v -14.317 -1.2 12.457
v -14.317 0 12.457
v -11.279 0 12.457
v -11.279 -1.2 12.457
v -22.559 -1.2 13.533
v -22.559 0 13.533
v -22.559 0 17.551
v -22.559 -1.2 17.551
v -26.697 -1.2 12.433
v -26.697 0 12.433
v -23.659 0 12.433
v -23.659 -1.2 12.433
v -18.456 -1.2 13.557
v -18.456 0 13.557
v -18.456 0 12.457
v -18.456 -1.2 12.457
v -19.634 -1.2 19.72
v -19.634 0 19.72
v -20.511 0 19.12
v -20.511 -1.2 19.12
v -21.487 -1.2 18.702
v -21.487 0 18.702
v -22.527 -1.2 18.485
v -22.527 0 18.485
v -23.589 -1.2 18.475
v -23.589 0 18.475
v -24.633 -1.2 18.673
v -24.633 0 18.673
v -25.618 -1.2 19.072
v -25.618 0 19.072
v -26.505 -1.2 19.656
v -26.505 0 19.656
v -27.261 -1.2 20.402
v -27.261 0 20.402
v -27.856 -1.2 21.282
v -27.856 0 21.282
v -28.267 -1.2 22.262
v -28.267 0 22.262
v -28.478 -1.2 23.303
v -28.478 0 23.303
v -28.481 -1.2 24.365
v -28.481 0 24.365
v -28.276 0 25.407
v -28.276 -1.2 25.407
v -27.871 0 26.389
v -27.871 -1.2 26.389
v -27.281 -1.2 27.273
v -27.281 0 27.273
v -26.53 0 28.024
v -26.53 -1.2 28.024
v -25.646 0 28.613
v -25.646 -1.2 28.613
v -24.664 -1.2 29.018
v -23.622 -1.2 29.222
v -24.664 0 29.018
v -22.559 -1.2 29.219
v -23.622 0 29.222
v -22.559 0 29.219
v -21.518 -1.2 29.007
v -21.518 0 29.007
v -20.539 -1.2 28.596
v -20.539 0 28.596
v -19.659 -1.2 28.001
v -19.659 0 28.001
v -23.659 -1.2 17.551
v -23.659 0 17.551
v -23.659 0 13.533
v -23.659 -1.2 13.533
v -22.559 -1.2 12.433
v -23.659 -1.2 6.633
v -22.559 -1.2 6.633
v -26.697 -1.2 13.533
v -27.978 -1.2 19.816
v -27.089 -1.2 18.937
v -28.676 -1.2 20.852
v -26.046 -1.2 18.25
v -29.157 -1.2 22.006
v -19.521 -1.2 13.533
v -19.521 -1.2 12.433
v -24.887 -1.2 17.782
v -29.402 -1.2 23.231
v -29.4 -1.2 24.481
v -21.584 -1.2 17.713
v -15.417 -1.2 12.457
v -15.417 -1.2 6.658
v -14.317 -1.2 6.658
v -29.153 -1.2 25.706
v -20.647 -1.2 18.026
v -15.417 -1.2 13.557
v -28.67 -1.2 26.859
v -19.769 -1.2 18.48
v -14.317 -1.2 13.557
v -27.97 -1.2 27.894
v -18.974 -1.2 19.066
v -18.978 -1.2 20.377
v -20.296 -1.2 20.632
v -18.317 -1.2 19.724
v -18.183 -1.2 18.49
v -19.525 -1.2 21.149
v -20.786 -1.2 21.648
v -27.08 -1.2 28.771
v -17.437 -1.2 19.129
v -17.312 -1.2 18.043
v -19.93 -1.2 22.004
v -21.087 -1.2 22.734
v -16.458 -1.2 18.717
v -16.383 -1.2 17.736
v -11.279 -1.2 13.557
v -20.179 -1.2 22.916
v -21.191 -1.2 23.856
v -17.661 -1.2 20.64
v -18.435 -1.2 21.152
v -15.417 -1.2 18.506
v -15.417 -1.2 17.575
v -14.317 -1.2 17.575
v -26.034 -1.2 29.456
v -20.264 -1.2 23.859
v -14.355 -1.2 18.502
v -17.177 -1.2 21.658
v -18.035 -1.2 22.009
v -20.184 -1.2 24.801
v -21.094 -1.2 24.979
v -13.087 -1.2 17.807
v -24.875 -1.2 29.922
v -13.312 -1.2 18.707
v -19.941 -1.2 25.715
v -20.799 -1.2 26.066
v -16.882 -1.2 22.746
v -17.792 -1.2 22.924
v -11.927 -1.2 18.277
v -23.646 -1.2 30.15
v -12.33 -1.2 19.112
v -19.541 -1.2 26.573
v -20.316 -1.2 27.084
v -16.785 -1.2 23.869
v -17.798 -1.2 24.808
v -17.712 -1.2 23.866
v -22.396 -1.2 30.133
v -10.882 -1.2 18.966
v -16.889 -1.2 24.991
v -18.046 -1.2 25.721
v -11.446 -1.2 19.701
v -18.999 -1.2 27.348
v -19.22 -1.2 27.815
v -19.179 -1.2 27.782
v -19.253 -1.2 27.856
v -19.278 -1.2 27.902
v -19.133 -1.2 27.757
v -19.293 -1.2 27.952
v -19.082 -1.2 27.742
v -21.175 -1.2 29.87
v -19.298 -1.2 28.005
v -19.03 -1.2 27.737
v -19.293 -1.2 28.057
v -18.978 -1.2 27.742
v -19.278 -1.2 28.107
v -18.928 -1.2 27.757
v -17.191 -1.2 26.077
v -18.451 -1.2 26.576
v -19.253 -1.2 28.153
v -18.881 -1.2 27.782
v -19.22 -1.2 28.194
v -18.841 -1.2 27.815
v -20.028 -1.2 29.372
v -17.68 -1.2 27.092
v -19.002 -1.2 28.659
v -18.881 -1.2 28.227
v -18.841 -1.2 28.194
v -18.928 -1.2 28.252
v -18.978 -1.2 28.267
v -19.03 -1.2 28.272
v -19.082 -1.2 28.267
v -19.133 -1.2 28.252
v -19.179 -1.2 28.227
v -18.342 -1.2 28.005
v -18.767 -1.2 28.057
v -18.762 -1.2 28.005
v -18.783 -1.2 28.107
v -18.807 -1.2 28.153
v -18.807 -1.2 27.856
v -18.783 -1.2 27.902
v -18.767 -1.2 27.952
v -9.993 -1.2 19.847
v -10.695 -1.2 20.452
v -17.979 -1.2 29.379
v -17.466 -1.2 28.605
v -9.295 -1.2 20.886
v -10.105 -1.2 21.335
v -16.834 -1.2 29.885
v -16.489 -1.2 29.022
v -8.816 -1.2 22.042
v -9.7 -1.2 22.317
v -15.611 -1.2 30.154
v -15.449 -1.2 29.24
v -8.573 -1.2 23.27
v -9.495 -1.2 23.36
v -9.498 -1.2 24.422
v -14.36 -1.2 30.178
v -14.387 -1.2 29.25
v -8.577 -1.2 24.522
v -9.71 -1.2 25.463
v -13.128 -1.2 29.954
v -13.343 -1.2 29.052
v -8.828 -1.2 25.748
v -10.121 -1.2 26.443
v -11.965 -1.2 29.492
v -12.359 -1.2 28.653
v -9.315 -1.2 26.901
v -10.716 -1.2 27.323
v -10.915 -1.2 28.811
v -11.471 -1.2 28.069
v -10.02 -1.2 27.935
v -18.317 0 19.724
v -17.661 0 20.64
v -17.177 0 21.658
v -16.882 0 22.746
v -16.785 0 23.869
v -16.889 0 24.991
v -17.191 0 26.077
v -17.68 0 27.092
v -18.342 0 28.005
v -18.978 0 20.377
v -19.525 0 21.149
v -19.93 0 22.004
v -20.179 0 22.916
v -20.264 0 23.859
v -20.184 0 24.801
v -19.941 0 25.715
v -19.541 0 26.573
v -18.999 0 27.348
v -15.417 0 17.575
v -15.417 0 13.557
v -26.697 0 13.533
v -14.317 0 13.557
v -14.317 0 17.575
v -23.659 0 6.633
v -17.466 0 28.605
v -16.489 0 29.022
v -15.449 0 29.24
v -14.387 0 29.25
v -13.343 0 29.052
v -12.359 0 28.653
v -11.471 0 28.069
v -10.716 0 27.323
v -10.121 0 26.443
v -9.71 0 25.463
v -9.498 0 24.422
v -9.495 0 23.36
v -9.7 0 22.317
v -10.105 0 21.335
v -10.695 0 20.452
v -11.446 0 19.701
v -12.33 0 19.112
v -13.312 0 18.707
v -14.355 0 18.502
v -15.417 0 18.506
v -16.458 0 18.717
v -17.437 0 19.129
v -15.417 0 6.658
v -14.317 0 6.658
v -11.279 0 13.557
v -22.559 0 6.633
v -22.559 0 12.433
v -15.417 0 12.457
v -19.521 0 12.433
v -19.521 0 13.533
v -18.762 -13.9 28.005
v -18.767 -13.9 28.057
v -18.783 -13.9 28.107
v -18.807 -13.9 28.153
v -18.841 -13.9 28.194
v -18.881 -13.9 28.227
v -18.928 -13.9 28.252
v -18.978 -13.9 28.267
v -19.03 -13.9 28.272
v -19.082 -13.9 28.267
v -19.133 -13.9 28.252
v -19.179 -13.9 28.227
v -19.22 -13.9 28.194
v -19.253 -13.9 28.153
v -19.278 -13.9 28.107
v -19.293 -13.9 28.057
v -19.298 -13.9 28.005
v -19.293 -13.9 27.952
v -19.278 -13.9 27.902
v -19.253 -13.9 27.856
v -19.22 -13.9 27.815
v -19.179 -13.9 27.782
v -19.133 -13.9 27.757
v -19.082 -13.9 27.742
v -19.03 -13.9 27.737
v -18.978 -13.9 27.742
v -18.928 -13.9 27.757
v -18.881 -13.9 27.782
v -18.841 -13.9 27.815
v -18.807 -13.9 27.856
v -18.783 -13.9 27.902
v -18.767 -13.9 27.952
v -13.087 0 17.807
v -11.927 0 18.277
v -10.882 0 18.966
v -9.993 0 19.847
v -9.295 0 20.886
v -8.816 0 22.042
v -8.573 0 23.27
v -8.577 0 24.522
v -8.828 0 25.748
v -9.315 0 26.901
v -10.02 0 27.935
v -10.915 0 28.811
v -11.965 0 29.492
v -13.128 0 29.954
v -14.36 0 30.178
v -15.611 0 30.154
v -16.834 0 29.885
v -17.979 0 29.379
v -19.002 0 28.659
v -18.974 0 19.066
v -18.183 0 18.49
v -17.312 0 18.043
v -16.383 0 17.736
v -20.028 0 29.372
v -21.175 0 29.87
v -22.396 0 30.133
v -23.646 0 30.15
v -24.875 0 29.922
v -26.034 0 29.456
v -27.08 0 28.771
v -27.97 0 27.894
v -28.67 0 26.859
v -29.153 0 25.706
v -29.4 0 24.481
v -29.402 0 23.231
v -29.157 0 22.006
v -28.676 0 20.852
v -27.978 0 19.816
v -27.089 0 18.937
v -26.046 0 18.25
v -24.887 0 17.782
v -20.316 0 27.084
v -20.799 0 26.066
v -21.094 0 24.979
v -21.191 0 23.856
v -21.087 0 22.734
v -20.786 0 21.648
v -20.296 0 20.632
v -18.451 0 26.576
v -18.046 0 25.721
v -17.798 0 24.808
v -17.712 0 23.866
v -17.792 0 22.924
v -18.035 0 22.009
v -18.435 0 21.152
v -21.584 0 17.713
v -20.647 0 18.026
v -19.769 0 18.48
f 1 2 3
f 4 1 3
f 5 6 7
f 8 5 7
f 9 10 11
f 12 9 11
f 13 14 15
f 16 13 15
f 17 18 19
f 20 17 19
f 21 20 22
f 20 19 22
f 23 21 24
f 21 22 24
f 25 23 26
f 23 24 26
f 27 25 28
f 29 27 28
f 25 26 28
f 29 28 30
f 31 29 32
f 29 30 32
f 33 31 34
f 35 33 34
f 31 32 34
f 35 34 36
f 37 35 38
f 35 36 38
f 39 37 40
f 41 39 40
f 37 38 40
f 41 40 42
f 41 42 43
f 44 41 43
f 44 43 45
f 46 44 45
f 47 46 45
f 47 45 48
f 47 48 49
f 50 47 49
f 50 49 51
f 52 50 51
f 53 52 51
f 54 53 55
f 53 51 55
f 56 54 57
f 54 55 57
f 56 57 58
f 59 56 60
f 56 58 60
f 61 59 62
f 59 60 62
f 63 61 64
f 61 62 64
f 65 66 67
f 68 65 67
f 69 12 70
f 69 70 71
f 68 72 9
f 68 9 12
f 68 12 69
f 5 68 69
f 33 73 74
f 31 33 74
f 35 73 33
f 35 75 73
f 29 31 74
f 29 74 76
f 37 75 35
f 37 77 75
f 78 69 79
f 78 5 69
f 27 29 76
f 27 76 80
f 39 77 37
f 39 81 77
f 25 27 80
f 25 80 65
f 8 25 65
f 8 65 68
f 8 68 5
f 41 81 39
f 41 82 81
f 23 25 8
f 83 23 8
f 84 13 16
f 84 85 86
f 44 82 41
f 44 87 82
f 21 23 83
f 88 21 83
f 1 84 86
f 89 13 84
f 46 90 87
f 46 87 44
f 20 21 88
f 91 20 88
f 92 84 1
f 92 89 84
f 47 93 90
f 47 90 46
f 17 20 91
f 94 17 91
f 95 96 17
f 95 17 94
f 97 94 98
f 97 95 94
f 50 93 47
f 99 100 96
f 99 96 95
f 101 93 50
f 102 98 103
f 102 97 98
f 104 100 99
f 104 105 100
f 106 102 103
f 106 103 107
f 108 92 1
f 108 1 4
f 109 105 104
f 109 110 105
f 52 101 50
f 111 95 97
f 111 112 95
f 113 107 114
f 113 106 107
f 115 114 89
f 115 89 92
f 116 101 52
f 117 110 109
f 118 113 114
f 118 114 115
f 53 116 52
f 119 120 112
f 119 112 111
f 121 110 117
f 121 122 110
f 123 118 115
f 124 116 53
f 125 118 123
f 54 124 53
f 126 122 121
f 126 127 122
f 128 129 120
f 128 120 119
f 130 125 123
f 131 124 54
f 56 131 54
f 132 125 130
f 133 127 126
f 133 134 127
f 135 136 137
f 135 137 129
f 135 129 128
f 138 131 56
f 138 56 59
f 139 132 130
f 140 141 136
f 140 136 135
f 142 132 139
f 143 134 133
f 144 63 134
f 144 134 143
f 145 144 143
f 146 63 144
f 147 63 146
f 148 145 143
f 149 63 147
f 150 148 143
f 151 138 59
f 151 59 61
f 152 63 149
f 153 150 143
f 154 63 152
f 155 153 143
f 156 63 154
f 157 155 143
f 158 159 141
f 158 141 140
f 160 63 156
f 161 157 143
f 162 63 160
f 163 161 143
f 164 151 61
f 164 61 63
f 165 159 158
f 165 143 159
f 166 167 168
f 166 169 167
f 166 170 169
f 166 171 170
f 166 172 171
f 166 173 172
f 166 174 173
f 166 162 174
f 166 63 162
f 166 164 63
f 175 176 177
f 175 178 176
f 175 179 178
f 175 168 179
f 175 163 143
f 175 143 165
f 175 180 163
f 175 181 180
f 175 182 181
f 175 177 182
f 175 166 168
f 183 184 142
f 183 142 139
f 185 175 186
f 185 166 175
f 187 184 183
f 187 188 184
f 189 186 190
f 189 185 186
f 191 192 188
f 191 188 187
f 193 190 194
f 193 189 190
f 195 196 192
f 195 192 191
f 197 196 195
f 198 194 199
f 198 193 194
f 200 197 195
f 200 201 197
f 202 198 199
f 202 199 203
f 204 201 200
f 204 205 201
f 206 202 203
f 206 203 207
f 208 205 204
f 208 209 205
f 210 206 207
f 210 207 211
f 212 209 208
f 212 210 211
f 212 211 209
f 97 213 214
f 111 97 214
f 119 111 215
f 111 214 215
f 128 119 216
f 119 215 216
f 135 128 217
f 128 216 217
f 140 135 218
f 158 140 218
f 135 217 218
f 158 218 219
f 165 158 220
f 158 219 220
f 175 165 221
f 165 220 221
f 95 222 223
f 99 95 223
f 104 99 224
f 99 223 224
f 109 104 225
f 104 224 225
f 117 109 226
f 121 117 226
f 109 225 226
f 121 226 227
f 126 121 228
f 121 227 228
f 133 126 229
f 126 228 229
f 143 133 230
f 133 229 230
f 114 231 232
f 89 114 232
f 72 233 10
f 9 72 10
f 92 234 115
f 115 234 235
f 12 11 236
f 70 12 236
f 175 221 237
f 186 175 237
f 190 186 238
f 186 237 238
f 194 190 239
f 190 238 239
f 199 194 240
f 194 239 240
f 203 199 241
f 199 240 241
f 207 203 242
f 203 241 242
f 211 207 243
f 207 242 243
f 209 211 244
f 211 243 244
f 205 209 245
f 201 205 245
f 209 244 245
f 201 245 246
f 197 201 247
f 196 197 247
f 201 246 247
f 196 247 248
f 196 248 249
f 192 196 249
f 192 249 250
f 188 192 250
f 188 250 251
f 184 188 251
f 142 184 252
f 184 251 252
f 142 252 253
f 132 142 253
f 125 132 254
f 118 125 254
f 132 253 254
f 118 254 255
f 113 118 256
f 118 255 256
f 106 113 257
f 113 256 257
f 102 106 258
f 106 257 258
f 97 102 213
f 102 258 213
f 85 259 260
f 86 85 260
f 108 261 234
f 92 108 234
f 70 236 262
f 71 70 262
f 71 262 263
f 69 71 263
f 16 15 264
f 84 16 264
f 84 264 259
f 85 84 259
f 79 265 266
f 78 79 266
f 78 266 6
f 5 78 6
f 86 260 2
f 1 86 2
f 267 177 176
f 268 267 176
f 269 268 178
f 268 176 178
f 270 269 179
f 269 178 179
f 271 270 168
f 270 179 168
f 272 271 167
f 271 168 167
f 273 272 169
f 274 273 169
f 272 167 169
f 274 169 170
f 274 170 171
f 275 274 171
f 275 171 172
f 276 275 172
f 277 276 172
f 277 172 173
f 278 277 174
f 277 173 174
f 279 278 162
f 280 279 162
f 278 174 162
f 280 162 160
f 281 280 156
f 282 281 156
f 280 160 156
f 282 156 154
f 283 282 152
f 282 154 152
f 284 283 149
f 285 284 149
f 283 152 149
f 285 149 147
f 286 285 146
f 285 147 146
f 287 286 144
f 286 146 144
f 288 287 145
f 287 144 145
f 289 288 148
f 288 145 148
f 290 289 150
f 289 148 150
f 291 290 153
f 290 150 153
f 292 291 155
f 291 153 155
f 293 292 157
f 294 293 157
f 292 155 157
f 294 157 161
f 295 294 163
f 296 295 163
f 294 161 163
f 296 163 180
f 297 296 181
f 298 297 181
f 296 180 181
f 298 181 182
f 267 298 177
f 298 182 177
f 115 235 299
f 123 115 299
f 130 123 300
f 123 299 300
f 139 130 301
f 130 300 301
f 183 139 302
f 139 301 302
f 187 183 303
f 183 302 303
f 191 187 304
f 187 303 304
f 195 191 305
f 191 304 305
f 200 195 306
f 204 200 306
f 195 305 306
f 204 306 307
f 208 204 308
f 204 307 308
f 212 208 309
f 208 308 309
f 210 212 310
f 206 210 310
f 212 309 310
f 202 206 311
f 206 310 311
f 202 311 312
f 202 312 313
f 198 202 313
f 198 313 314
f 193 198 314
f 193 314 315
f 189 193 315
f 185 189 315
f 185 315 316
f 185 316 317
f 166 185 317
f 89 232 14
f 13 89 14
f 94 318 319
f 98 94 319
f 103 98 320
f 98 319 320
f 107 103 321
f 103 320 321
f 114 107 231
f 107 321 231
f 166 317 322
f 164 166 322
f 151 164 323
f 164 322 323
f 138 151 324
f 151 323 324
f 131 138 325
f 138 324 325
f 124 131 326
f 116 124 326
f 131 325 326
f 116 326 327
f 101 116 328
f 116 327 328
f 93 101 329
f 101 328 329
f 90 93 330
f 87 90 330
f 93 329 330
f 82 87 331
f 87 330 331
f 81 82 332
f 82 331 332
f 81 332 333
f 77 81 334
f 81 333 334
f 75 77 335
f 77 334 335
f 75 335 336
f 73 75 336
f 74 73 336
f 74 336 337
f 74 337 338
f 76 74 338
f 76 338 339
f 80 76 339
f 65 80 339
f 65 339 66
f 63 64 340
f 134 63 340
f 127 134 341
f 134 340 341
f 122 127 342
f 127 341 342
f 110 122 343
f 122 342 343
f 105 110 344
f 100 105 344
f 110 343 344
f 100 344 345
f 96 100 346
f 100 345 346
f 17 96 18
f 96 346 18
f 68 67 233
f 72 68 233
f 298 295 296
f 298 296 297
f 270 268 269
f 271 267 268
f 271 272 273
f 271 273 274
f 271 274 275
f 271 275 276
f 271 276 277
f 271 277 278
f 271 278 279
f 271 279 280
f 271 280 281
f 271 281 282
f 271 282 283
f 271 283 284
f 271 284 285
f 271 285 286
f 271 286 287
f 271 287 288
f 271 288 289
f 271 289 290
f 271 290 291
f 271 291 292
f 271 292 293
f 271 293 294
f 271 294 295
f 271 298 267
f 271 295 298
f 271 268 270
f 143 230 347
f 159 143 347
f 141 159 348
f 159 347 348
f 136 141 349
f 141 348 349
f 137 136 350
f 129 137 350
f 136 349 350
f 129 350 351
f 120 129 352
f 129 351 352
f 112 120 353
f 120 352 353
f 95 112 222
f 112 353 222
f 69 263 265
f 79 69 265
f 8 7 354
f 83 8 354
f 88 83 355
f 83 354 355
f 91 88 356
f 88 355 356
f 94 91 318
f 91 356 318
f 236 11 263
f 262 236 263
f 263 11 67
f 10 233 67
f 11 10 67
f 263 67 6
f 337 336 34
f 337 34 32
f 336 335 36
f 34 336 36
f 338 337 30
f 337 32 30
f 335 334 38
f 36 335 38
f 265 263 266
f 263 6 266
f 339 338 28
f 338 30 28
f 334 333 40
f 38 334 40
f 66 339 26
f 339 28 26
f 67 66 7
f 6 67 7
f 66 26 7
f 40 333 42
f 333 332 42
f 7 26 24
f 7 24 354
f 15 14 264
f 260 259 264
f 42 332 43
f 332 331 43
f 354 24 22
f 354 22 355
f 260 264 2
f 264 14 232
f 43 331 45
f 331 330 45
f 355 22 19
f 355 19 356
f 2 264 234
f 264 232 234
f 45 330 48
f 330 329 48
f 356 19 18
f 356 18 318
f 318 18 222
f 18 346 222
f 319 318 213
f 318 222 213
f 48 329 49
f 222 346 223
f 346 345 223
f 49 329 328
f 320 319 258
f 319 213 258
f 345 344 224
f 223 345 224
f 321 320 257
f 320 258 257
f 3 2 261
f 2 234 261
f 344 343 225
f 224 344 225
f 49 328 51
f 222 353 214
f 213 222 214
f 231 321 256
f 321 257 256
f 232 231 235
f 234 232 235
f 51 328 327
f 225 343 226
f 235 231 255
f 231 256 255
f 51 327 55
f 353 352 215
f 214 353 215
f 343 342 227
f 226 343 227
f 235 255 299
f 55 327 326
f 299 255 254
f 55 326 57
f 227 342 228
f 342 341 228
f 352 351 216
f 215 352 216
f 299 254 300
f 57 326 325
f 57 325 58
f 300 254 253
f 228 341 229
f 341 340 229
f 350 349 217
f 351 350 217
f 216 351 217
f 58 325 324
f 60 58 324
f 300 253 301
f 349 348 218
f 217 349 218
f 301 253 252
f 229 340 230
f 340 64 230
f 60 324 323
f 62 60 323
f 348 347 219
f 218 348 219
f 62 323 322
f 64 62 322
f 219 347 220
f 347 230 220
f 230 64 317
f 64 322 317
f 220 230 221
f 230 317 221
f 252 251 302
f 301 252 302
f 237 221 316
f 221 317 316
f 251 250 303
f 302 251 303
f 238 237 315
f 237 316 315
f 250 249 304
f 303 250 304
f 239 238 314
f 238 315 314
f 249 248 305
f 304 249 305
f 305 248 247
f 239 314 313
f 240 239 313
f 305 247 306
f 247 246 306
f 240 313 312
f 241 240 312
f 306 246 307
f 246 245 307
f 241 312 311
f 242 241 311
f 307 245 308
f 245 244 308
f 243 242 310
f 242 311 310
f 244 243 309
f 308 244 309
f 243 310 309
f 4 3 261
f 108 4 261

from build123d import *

# Parameters (mm, degrees)
F1_DEPTH = 1.2
F2_R     = 0.267864
F3_DEPTH = 12.7


with BuildPart() as f1:
    # F0 (on Front) → F1 (new body)
    with BuildSketch(Plane.XZ):
        with BuildLine():
            Line((-22.558661, 13.532754), (-22.558661, 17.550706))
            ThreePointArc((-22.558661, 17.550706), (-20.646676, 18.025718), (-18.973681, 19.066109))
            ThreePointArc((-18.973681, 19.066109), (-17.31198, 18.043084), (-15.41748, 17.575431))
            Line((-15.41748, 17.575431), (-15.41748, 13.55748))
            Line((-15.41748, 13.55748), (-18.455535, 13.55748))
            Line((-18.455535, 13.55748), (-18.455535, 12.45748))
            Line((-18.455535, 12.45748), (-15.41748, 12.45748))
            Line((-15.41748, 12.45748), (-15.41748, 6.657985))
            Line((-15.41748, 6.657985), (-14.31748, 6.657985))
            Line((-14.31748, 6.657985), (-14.31748, 12.45748))
            Line((-14.31748, 12.45748), (-11.279425, 12.45748))
            Line((-11.279425, 12.45748), (-11.279425, 13.55748))
            Line((-11.279425, 13.55748), (-14.31748, 13.55748))
            Line((-14.31748, 13.55748), (-14.31748, 17.575431))
            ThreePointArc((-14.31748, 17.575431), (-9.043176, 26.336733), (-19.002461, 28.658661))
            ThreePointArc((-19.002461, 28.658661), (-28.940326, 26.294523), (-23.658661, 17.550706))
            Line((-23.658661, 17.550706), (-23.658661, 13.532754))
            Line((-23.658661, 13.532754), (-26.696716, 13.532754))
            Line((-26.696716, 13.532754), (-26.696716, 12.432754))
            Line((-26.696716, 12.432754), (-23.658661, 12.432754))
            Line((-23.658661, 12.432754), (-23.658661, 6.63326))
            Line((-23.658661, 6.63326), (-22.558661, 6.63326))
            Line((-22.558661, 6.63326), (-22.558661, 12.432754))
            Line((-22.558661, 12.432754), (-19.520607, 12.432754))
            Line((-19.520607, 12.432754), (-19.520607, 13.532754))
            Line((-19.520607, 13.532754), (-22.558661, 13.532754))
        make_face()
        with BuildLine():
            ThreePointArc((-19.634369, 19.720153), (-28.505536, 23.833831), (-19.659213, 28.000664))
            ThreePointArc((-19.659213, 28.000664), (-21.190733, 23.855777), (-19.634369, 19.720153))
        make_face(mode=Mode.SUBTRACT)
        with BuildLine():
            ThreePointArc((-18.977614, 20.377132), (-20.264355, 23.858556), (-18.998527, 27.347639))
            ThreePointArc((-18.998527, 27.347639), (-17.711786, 23.866214), (-18.977614, 20.377132))
        make_face(mode=Mode.SUBTRACT)
        with BuildLine():
            ThreePointArc((-18.341772, 28.004617), (-9.470605, 23.89094), (-18.316929, 19.724106))
            ThreePointArc((-18.316929, 19.724106), (-16.785408, 23.868994), (-18.341772, 28.004617))
        make_face(mode=Mode.SUBTRACT)
    extrude(amount=F1_DEPTH)

    # F2 (on face) → F3 (join)
    with BuildSketch(Plane.XZ.offset(1.2)):
        with Locations((-19.03018, 28.004617)):
            Circle(F2_R)
    extrude(amount=F3_DEPTH)


solid = f1.part
